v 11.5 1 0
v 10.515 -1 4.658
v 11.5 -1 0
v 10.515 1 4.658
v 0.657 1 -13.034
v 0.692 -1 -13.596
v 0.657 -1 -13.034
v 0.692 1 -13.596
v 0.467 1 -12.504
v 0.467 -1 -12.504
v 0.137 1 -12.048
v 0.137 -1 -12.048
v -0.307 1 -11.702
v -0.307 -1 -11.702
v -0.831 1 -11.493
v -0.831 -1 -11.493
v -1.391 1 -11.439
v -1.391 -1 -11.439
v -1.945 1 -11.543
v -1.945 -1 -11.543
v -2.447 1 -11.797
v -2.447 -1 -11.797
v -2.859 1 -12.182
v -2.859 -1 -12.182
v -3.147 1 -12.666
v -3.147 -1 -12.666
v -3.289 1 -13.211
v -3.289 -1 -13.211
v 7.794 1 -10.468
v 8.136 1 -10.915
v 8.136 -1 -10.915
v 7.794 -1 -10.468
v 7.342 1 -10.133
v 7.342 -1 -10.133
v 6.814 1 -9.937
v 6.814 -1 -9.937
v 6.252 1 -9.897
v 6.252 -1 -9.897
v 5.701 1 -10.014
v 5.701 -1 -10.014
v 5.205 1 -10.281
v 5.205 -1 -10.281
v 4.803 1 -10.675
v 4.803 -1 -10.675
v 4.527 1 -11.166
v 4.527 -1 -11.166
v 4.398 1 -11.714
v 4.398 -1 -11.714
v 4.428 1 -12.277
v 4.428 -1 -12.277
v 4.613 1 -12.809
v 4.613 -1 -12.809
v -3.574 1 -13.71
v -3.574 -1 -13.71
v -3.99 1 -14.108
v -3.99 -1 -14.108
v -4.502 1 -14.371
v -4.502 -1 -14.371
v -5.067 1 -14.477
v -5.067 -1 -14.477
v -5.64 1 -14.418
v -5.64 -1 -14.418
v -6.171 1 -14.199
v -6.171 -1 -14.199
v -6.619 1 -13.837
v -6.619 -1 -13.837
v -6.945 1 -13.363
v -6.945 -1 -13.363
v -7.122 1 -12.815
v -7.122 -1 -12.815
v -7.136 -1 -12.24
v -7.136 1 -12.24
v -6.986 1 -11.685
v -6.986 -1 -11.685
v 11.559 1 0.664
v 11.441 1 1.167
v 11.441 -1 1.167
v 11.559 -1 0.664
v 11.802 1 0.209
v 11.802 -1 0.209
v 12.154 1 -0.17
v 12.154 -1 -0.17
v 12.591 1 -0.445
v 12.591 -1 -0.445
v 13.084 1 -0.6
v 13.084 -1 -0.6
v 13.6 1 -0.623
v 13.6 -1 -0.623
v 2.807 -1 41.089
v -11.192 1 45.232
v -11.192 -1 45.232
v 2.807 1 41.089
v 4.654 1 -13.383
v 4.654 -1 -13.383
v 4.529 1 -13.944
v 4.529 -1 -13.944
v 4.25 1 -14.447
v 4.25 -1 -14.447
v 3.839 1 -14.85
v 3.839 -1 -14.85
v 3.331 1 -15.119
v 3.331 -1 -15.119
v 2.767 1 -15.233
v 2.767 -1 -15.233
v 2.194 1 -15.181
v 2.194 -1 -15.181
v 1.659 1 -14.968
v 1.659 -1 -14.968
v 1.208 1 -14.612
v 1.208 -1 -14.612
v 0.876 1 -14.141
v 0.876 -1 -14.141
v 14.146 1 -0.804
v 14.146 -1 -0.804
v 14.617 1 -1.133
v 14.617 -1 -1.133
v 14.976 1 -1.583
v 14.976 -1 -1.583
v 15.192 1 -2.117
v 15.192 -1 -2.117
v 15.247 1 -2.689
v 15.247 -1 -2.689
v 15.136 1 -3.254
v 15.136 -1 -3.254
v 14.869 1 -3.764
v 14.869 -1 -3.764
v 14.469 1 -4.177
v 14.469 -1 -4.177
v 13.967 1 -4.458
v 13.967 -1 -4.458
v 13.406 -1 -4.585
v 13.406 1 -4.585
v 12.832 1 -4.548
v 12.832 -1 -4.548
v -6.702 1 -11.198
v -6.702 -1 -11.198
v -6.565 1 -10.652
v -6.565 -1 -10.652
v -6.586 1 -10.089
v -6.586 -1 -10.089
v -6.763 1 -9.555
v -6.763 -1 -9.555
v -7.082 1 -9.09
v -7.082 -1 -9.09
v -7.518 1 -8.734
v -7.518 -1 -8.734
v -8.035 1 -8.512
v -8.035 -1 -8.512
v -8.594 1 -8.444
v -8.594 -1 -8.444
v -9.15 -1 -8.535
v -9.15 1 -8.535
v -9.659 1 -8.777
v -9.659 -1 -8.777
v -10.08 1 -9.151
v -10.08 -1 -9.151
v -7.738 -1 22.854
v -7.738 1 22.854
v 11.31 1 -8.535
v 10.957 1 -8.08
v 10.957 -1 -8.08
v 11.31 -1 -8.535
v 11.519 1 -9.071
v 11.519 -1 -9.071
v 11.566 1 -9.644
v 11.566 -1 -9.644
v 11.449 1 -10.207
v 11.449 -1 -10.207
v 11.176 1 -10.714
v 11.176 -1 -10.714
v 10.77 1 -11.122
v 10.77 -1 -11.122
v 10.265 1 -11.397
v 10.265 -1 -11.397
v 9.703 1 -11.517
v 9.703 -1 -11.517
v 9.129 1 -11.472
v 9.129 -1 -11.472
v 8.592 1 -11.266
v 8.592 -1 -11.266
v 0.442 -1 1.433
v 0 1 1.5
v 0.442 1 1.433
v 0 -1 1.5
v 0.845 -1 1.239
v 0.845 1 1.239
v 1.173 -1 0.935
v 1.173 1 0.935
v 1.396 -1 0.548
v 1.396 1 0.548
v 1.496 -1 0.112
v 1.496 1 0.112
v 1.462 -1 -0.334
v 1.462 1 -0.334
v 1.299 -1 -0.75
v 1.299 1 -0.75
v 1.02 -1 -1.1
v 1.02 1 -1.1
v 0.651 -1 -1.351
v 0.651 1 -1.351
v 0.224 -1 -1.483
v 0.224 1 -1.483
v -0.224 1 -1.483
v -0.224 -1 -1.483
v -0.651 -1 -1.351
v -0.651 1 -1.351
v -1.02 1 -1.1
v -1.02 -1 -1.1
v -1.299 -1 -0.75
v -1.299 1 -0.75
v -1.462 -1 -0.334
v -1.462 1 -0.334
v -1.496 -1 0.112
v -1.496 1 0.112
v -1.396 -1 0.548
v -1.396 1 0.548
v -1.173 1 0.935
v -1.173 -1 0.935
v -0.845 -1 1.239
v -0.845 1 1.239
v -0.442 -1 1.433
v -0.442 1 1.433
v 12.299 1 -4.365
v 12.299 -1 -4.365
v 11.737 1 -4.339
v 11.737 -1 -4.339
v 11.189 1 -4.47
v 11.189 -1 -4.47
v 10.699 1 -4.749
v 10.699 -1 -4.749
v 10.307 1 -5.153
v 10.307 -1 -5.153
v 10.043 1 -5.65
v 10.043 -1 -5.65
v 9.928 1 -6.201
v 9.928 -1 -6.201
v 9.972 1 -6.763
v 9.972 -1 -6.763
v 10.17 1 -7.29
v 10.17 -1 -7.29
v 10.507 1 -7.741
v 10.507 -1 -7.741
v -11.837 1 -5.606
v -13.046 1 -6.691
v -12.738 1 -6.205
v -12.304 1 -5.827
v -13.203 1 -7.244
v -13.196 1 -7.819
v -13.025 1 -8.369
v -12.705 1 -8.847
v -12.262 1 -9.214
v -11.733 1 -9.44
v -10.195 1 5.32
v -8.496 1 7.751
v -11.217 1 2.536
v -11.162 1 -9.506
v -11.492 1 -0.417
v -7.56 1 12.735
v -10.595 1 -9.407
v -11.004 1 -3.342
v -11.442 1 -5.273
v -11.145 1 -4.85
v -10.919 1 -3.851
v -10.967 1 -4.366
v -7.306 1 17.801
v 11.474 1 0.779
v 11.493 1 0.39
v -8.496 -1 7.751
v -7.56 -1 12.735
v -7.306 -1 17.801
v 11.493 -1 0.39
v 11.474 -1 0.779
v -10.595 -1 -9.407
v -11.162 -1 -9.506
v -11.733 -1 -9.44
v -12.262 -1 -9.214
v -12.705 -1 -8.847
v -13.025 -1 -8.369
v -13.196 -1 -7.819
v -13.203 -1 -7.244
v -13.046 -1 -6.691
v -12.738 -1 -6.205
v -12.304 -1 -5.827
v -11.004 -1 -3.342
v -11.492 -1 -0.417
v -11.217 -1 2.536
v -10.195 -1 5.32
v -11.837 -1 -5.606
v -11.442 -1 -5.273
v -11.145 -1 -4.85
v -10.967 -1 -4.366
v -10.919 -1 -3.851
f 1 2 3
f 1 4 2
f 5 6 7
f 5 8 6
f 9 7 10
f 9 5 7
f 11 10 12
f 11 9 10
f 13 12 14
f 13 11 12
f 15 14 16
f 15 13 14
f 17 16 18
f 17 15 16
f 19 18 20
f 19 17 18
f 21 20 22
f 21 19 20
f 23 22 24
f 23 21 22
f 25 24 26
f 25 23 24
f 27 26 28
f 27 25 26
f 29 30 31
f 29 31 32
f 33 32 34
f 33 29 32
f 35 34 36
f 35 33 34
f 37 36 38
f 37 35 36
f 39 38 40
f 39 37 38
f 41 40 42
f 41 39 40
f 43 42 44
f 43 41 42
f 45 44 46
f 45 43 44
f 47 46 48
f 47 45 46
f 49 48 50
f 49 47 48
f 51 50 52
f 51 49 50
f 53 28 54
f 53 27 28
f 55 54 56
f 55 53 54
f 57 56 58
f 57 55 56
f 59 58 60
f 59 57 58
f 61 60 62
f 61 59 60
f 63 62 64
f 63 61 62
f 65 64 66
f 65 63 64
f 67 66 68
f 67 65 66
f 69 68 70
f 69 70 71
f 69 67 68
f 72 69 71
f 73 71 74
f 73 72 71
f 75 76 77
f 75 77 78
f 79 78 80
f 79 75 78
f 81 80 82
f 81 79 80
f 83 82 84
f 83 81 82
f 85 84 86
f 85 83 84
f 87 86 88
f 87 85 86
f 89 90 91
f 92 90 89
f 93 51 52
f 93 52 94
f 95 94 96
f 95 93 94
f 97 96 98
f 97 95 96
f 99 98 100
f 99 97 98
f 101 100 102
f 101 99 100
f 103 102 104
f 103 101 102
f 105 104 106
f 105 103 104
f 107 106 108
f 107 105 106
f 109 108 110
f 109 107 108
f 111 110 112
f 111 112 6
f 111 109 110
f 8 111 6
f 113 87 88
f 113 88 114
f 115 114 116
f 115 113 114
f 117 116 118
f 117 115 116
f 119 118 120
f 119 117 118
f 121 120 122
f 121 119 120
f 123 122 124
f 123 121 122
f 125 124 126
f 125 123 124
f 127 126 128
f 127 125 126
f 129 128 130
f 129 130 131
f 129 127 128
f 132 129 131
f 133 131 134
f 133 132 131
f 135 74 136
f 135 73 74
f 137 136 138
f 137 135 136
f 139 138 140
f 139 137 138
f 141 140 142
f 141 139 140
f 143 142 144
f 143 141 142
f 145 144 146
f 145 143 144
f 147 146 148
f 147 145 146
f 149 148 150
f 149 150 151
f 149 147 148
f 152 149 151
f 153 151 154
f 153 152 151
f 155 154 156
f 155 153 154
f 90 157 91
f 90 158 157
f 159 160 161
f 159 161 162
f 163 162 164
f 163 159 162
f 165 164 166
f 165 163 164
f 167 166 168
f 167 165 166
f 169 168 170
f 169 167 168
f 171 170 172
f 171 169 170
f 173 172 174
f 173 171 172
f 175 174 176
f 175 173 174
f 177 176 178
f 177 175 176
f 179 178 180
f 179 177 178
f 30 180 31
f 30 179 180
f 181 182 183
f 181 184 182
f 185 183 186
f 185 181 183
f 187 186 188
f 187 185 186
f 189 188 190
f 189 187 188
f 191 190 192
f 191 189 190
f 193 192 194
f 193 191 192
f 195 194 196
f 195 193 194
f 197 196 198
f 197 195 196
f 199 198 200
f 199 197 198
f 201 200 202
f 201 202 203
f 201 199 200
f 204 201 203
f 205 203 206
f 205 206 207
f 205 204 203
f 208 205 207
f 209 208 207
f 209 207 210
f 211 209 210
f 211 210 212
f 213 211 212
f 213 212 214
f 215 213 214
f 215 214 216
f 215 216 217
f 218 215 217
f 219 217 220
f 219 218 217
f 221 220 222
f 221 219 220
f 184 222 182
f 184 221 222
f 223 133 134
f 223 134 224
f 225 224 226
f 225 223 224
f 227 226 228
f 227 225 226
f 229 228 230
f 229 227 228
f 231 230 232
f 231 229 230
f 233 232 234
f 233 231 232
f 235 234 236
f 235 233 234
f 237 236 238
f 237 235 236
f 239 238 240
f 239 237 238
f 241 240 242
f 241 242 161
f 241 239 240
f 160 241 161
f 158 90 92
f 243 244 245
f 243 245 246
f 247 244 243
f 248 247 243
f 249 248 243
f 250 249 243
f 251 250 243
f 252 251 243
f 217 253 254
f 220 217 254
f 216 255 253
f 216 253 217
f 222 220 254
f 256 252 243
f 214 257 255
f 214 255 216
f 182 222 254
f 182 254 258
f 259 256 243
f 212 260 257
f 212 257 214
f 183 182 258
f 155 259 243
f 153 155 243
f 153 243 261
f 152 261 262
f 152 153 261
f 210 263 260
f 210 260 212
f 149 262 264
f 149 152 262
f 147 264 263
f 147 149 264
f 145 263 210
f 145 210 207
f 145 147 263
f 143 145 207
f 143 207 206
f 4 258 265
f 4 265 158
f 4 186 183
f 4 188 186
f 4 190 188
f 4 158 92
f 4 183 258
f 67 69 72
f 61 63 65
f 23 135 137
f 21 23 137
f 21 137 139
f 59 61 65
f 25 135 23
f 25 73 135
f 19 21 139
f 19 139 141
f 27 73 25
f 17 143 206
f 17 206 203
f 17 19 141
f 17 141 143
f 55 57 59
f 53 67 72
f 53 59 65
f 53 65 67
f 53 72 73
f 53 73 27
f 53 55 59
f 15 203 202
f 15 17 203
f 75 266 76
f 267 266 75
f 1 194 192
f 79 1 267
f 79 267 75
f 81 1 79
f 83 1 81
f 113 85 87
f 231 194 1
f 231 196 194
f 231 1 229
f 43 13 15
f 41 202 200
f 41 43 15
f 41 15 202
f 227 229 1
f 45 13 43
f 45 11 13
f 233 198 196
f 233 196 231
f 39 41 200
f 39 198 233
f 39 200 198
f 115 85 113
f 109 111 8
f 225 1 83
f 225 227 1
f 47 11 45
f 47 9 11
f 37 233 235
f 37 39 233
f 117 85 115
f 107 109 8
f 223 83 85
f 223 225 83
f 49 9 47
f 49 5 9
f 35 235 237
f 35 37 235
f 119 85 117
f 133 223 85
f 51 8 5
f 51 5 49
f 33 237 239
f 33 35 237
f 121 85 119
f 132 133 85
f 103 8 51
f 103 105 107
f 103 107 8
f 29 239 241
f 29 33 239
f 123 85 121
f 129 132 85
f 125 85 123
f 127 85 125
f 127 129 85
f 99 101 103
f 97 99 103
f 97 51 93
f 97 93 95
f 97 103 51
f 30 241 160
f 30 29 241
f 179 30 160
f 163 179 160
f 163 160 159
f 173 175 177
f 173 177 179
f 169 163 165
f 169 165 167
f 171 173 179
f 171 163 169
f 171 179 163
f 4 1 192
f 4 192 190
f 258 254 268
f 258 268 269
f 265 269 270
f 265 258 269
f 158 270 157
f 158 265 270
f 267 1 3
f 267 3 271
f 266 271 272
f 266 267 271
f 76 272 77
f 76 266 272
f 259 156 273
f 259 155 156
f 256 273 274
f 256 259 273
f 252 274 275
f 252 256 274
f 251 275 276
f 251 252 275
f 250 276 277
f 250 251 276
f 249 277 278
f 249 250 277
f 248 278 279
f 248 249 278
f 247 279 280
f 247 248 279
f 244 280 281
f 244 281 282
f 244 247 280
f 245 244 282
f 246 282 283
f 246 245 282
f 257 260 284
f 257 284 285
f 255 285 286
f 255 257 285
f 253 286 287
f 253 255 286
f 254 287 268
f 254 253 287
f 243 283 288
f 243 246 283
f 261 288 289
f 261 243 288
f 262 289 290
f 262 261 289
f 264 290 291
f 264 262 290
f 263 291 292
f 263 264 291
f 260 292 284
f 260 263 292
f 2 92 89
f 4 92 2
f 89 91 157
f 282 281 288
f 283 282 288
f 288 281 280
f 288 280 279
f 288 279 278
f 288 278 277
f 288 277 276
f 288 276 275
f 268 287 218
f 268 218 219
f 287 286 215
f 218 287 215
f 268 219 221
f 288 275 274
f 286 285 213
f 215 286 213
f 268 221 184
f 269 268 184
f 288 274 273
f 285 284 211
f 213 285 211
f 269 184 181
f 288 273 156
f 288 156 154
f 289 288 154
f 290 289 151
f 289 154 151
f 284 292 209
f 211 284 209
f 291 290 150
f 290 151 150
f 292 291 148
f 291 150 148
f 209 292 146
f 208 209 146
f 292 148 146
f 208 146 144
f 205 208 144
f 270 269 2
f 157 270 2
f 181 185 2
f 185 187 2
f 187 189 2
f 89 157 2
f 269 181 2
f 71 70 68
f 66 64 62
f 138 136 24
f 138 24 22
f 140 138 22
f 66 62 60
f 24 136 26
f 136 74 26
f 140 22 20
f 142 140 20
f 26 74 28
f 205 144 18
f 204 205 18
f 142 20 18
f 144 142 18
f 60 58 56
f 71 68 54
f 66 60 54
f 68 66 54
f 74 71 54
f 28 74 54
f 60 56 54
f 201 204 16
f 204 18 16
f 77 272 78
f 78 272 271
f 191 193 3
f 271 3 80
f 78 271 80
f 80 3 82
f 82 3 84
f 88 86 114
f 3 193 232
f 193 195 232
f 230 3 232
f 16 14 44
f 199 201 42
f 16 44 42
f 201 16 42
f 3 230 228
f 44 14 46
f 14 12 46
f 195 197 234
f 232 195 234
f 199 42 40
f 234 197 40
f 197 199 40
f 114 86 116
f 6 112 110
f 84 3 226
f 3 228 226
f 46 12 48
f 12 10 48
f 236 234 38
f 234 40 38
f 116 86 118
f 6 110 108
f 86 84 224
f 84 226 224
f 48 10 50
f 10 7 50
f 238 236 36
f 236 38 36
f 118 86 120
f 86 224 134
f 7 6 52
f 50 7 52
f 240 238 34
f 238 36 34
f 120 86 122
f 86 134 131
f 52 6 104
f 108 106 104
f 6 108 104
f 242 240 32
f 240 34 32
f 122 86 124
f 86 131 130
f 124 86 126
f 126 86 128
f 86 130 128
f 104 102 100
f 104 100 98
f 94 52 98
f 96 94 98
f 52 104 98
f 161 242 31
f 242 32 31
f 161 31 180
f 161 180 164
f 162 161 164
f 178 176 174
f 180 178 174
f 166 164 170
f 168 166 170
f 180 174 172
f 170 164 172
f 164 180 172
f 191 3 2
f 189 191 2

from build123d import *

# Parameters (mm, degrees)
SKETCH1_R           = 1.5
BOSS_EXTRUDE3_DEPTH = 1
BOSS_EXTRUDE5_DEPTH = 1


with BuildPart() as part:
    # Sketch1 → Boss-Extrude3 (new, symmetric)
    with BuildSketch(Plane(origin=(0, 0, 0), x_dir=(1, 0, 0), z_dir=(0, 1, 0))):
        with BuildLine():
            Line((10.514574075, -4.657653059), (11.5, 0))
            ThreePointArc((11.5, 0), (11.485144533, -0.58434155), (11.440616514, -1.167173419))
            ThreePointArc((11.440616514, -1.167173419), (12.15387442, 0.169569159), (13.599672235, 0.622654405))
            ThreePointArc((13.599672235, 0.622654405), (15.211699124, 2.97560242), (12.831884171, 4.547695243))
            ThreePointArc((12.831884171, 4.547695243), (10.157548748, 5.392050021), (10.95665555, 8.080252631))
            ThreePointArc((10.95665555, 8.080252631), (10.987967437, 10.932272023), (8.135825754, 10.91545339))
            ThreePointArc((8.135825754, 10.91545339), (5.443597104, 10.130017304), (4.612843157, 12.808608879))
            ThreePointArc((4.612843157, 12.808608879), (3.052863924, 15.196381867), (0.691754597, 13.596332557))
            ThreePointArc((0.691754597, 13.596332557), (-1.109021523, 11.446399926), (-3.289035023, 13.210640864))
            ThreePointArc((-3.289035023, 13.210640864), (-5.913396009, 14.327656739), (-6.985968373, 11.684820465))
            ThreePointArc((-6.985968373, 11.684820465), (-7.287049374, 8.896567395), (-10.079986001, 9.150555482))
            ThreePointArc((-10.079986001, 9.150555482), (-12.882306434, 8.619523243), (-12.304062381, 5.826562651))
            ThreePointArc((-12.304062381, 5.826562651), (-11.145420085, 4.850260698), (-11.003753067, 3.341768759))
            ThreePointArc((-11.003753067, 3.341768759), (-4.007182474, -10.77926197), (10.514574075, -4.657653059))
        make_face()
        with Locations(Location((0, 0, 0), (0, 0, 270))):
            Circle(SKETCH1_R, mode=Mode.SUBTRACT)
    extrude(amount=BOSS_EXTRUDE3_DEPTH, both=True)

    # Sketch1<5> → Boss-Extrude5 (add, symmetric)
    with BuildSketch(Plane(origin=(0, 0, 0), x_dir=(1, 0, 0), z_dir=(0, 1, 0))):
        with BuildLine():
            Line((2.806807826, -41.088702969), (10.514574075, -4.657653059))
            ThreePointArc((10.514574075, -4.657653059), (1.846708509, -11.35075626), (-8.495825279, -7.750545324))
            ThreePointArc((-8.495825279, -7.750545324), (-7.347088724, -15.263704681), (-7.738414168, -22.854094893))
            Line((-7.738414168, -22.854094893), (-11.192007229, -45.231550072))
            Line((-11.192007229, -45.231550072), (2.806807826, -41.088702969))
        make_face()
    extrude(amount=BOSS_EXTRUDE5_DEPTH, both=True)


solid = part.part
